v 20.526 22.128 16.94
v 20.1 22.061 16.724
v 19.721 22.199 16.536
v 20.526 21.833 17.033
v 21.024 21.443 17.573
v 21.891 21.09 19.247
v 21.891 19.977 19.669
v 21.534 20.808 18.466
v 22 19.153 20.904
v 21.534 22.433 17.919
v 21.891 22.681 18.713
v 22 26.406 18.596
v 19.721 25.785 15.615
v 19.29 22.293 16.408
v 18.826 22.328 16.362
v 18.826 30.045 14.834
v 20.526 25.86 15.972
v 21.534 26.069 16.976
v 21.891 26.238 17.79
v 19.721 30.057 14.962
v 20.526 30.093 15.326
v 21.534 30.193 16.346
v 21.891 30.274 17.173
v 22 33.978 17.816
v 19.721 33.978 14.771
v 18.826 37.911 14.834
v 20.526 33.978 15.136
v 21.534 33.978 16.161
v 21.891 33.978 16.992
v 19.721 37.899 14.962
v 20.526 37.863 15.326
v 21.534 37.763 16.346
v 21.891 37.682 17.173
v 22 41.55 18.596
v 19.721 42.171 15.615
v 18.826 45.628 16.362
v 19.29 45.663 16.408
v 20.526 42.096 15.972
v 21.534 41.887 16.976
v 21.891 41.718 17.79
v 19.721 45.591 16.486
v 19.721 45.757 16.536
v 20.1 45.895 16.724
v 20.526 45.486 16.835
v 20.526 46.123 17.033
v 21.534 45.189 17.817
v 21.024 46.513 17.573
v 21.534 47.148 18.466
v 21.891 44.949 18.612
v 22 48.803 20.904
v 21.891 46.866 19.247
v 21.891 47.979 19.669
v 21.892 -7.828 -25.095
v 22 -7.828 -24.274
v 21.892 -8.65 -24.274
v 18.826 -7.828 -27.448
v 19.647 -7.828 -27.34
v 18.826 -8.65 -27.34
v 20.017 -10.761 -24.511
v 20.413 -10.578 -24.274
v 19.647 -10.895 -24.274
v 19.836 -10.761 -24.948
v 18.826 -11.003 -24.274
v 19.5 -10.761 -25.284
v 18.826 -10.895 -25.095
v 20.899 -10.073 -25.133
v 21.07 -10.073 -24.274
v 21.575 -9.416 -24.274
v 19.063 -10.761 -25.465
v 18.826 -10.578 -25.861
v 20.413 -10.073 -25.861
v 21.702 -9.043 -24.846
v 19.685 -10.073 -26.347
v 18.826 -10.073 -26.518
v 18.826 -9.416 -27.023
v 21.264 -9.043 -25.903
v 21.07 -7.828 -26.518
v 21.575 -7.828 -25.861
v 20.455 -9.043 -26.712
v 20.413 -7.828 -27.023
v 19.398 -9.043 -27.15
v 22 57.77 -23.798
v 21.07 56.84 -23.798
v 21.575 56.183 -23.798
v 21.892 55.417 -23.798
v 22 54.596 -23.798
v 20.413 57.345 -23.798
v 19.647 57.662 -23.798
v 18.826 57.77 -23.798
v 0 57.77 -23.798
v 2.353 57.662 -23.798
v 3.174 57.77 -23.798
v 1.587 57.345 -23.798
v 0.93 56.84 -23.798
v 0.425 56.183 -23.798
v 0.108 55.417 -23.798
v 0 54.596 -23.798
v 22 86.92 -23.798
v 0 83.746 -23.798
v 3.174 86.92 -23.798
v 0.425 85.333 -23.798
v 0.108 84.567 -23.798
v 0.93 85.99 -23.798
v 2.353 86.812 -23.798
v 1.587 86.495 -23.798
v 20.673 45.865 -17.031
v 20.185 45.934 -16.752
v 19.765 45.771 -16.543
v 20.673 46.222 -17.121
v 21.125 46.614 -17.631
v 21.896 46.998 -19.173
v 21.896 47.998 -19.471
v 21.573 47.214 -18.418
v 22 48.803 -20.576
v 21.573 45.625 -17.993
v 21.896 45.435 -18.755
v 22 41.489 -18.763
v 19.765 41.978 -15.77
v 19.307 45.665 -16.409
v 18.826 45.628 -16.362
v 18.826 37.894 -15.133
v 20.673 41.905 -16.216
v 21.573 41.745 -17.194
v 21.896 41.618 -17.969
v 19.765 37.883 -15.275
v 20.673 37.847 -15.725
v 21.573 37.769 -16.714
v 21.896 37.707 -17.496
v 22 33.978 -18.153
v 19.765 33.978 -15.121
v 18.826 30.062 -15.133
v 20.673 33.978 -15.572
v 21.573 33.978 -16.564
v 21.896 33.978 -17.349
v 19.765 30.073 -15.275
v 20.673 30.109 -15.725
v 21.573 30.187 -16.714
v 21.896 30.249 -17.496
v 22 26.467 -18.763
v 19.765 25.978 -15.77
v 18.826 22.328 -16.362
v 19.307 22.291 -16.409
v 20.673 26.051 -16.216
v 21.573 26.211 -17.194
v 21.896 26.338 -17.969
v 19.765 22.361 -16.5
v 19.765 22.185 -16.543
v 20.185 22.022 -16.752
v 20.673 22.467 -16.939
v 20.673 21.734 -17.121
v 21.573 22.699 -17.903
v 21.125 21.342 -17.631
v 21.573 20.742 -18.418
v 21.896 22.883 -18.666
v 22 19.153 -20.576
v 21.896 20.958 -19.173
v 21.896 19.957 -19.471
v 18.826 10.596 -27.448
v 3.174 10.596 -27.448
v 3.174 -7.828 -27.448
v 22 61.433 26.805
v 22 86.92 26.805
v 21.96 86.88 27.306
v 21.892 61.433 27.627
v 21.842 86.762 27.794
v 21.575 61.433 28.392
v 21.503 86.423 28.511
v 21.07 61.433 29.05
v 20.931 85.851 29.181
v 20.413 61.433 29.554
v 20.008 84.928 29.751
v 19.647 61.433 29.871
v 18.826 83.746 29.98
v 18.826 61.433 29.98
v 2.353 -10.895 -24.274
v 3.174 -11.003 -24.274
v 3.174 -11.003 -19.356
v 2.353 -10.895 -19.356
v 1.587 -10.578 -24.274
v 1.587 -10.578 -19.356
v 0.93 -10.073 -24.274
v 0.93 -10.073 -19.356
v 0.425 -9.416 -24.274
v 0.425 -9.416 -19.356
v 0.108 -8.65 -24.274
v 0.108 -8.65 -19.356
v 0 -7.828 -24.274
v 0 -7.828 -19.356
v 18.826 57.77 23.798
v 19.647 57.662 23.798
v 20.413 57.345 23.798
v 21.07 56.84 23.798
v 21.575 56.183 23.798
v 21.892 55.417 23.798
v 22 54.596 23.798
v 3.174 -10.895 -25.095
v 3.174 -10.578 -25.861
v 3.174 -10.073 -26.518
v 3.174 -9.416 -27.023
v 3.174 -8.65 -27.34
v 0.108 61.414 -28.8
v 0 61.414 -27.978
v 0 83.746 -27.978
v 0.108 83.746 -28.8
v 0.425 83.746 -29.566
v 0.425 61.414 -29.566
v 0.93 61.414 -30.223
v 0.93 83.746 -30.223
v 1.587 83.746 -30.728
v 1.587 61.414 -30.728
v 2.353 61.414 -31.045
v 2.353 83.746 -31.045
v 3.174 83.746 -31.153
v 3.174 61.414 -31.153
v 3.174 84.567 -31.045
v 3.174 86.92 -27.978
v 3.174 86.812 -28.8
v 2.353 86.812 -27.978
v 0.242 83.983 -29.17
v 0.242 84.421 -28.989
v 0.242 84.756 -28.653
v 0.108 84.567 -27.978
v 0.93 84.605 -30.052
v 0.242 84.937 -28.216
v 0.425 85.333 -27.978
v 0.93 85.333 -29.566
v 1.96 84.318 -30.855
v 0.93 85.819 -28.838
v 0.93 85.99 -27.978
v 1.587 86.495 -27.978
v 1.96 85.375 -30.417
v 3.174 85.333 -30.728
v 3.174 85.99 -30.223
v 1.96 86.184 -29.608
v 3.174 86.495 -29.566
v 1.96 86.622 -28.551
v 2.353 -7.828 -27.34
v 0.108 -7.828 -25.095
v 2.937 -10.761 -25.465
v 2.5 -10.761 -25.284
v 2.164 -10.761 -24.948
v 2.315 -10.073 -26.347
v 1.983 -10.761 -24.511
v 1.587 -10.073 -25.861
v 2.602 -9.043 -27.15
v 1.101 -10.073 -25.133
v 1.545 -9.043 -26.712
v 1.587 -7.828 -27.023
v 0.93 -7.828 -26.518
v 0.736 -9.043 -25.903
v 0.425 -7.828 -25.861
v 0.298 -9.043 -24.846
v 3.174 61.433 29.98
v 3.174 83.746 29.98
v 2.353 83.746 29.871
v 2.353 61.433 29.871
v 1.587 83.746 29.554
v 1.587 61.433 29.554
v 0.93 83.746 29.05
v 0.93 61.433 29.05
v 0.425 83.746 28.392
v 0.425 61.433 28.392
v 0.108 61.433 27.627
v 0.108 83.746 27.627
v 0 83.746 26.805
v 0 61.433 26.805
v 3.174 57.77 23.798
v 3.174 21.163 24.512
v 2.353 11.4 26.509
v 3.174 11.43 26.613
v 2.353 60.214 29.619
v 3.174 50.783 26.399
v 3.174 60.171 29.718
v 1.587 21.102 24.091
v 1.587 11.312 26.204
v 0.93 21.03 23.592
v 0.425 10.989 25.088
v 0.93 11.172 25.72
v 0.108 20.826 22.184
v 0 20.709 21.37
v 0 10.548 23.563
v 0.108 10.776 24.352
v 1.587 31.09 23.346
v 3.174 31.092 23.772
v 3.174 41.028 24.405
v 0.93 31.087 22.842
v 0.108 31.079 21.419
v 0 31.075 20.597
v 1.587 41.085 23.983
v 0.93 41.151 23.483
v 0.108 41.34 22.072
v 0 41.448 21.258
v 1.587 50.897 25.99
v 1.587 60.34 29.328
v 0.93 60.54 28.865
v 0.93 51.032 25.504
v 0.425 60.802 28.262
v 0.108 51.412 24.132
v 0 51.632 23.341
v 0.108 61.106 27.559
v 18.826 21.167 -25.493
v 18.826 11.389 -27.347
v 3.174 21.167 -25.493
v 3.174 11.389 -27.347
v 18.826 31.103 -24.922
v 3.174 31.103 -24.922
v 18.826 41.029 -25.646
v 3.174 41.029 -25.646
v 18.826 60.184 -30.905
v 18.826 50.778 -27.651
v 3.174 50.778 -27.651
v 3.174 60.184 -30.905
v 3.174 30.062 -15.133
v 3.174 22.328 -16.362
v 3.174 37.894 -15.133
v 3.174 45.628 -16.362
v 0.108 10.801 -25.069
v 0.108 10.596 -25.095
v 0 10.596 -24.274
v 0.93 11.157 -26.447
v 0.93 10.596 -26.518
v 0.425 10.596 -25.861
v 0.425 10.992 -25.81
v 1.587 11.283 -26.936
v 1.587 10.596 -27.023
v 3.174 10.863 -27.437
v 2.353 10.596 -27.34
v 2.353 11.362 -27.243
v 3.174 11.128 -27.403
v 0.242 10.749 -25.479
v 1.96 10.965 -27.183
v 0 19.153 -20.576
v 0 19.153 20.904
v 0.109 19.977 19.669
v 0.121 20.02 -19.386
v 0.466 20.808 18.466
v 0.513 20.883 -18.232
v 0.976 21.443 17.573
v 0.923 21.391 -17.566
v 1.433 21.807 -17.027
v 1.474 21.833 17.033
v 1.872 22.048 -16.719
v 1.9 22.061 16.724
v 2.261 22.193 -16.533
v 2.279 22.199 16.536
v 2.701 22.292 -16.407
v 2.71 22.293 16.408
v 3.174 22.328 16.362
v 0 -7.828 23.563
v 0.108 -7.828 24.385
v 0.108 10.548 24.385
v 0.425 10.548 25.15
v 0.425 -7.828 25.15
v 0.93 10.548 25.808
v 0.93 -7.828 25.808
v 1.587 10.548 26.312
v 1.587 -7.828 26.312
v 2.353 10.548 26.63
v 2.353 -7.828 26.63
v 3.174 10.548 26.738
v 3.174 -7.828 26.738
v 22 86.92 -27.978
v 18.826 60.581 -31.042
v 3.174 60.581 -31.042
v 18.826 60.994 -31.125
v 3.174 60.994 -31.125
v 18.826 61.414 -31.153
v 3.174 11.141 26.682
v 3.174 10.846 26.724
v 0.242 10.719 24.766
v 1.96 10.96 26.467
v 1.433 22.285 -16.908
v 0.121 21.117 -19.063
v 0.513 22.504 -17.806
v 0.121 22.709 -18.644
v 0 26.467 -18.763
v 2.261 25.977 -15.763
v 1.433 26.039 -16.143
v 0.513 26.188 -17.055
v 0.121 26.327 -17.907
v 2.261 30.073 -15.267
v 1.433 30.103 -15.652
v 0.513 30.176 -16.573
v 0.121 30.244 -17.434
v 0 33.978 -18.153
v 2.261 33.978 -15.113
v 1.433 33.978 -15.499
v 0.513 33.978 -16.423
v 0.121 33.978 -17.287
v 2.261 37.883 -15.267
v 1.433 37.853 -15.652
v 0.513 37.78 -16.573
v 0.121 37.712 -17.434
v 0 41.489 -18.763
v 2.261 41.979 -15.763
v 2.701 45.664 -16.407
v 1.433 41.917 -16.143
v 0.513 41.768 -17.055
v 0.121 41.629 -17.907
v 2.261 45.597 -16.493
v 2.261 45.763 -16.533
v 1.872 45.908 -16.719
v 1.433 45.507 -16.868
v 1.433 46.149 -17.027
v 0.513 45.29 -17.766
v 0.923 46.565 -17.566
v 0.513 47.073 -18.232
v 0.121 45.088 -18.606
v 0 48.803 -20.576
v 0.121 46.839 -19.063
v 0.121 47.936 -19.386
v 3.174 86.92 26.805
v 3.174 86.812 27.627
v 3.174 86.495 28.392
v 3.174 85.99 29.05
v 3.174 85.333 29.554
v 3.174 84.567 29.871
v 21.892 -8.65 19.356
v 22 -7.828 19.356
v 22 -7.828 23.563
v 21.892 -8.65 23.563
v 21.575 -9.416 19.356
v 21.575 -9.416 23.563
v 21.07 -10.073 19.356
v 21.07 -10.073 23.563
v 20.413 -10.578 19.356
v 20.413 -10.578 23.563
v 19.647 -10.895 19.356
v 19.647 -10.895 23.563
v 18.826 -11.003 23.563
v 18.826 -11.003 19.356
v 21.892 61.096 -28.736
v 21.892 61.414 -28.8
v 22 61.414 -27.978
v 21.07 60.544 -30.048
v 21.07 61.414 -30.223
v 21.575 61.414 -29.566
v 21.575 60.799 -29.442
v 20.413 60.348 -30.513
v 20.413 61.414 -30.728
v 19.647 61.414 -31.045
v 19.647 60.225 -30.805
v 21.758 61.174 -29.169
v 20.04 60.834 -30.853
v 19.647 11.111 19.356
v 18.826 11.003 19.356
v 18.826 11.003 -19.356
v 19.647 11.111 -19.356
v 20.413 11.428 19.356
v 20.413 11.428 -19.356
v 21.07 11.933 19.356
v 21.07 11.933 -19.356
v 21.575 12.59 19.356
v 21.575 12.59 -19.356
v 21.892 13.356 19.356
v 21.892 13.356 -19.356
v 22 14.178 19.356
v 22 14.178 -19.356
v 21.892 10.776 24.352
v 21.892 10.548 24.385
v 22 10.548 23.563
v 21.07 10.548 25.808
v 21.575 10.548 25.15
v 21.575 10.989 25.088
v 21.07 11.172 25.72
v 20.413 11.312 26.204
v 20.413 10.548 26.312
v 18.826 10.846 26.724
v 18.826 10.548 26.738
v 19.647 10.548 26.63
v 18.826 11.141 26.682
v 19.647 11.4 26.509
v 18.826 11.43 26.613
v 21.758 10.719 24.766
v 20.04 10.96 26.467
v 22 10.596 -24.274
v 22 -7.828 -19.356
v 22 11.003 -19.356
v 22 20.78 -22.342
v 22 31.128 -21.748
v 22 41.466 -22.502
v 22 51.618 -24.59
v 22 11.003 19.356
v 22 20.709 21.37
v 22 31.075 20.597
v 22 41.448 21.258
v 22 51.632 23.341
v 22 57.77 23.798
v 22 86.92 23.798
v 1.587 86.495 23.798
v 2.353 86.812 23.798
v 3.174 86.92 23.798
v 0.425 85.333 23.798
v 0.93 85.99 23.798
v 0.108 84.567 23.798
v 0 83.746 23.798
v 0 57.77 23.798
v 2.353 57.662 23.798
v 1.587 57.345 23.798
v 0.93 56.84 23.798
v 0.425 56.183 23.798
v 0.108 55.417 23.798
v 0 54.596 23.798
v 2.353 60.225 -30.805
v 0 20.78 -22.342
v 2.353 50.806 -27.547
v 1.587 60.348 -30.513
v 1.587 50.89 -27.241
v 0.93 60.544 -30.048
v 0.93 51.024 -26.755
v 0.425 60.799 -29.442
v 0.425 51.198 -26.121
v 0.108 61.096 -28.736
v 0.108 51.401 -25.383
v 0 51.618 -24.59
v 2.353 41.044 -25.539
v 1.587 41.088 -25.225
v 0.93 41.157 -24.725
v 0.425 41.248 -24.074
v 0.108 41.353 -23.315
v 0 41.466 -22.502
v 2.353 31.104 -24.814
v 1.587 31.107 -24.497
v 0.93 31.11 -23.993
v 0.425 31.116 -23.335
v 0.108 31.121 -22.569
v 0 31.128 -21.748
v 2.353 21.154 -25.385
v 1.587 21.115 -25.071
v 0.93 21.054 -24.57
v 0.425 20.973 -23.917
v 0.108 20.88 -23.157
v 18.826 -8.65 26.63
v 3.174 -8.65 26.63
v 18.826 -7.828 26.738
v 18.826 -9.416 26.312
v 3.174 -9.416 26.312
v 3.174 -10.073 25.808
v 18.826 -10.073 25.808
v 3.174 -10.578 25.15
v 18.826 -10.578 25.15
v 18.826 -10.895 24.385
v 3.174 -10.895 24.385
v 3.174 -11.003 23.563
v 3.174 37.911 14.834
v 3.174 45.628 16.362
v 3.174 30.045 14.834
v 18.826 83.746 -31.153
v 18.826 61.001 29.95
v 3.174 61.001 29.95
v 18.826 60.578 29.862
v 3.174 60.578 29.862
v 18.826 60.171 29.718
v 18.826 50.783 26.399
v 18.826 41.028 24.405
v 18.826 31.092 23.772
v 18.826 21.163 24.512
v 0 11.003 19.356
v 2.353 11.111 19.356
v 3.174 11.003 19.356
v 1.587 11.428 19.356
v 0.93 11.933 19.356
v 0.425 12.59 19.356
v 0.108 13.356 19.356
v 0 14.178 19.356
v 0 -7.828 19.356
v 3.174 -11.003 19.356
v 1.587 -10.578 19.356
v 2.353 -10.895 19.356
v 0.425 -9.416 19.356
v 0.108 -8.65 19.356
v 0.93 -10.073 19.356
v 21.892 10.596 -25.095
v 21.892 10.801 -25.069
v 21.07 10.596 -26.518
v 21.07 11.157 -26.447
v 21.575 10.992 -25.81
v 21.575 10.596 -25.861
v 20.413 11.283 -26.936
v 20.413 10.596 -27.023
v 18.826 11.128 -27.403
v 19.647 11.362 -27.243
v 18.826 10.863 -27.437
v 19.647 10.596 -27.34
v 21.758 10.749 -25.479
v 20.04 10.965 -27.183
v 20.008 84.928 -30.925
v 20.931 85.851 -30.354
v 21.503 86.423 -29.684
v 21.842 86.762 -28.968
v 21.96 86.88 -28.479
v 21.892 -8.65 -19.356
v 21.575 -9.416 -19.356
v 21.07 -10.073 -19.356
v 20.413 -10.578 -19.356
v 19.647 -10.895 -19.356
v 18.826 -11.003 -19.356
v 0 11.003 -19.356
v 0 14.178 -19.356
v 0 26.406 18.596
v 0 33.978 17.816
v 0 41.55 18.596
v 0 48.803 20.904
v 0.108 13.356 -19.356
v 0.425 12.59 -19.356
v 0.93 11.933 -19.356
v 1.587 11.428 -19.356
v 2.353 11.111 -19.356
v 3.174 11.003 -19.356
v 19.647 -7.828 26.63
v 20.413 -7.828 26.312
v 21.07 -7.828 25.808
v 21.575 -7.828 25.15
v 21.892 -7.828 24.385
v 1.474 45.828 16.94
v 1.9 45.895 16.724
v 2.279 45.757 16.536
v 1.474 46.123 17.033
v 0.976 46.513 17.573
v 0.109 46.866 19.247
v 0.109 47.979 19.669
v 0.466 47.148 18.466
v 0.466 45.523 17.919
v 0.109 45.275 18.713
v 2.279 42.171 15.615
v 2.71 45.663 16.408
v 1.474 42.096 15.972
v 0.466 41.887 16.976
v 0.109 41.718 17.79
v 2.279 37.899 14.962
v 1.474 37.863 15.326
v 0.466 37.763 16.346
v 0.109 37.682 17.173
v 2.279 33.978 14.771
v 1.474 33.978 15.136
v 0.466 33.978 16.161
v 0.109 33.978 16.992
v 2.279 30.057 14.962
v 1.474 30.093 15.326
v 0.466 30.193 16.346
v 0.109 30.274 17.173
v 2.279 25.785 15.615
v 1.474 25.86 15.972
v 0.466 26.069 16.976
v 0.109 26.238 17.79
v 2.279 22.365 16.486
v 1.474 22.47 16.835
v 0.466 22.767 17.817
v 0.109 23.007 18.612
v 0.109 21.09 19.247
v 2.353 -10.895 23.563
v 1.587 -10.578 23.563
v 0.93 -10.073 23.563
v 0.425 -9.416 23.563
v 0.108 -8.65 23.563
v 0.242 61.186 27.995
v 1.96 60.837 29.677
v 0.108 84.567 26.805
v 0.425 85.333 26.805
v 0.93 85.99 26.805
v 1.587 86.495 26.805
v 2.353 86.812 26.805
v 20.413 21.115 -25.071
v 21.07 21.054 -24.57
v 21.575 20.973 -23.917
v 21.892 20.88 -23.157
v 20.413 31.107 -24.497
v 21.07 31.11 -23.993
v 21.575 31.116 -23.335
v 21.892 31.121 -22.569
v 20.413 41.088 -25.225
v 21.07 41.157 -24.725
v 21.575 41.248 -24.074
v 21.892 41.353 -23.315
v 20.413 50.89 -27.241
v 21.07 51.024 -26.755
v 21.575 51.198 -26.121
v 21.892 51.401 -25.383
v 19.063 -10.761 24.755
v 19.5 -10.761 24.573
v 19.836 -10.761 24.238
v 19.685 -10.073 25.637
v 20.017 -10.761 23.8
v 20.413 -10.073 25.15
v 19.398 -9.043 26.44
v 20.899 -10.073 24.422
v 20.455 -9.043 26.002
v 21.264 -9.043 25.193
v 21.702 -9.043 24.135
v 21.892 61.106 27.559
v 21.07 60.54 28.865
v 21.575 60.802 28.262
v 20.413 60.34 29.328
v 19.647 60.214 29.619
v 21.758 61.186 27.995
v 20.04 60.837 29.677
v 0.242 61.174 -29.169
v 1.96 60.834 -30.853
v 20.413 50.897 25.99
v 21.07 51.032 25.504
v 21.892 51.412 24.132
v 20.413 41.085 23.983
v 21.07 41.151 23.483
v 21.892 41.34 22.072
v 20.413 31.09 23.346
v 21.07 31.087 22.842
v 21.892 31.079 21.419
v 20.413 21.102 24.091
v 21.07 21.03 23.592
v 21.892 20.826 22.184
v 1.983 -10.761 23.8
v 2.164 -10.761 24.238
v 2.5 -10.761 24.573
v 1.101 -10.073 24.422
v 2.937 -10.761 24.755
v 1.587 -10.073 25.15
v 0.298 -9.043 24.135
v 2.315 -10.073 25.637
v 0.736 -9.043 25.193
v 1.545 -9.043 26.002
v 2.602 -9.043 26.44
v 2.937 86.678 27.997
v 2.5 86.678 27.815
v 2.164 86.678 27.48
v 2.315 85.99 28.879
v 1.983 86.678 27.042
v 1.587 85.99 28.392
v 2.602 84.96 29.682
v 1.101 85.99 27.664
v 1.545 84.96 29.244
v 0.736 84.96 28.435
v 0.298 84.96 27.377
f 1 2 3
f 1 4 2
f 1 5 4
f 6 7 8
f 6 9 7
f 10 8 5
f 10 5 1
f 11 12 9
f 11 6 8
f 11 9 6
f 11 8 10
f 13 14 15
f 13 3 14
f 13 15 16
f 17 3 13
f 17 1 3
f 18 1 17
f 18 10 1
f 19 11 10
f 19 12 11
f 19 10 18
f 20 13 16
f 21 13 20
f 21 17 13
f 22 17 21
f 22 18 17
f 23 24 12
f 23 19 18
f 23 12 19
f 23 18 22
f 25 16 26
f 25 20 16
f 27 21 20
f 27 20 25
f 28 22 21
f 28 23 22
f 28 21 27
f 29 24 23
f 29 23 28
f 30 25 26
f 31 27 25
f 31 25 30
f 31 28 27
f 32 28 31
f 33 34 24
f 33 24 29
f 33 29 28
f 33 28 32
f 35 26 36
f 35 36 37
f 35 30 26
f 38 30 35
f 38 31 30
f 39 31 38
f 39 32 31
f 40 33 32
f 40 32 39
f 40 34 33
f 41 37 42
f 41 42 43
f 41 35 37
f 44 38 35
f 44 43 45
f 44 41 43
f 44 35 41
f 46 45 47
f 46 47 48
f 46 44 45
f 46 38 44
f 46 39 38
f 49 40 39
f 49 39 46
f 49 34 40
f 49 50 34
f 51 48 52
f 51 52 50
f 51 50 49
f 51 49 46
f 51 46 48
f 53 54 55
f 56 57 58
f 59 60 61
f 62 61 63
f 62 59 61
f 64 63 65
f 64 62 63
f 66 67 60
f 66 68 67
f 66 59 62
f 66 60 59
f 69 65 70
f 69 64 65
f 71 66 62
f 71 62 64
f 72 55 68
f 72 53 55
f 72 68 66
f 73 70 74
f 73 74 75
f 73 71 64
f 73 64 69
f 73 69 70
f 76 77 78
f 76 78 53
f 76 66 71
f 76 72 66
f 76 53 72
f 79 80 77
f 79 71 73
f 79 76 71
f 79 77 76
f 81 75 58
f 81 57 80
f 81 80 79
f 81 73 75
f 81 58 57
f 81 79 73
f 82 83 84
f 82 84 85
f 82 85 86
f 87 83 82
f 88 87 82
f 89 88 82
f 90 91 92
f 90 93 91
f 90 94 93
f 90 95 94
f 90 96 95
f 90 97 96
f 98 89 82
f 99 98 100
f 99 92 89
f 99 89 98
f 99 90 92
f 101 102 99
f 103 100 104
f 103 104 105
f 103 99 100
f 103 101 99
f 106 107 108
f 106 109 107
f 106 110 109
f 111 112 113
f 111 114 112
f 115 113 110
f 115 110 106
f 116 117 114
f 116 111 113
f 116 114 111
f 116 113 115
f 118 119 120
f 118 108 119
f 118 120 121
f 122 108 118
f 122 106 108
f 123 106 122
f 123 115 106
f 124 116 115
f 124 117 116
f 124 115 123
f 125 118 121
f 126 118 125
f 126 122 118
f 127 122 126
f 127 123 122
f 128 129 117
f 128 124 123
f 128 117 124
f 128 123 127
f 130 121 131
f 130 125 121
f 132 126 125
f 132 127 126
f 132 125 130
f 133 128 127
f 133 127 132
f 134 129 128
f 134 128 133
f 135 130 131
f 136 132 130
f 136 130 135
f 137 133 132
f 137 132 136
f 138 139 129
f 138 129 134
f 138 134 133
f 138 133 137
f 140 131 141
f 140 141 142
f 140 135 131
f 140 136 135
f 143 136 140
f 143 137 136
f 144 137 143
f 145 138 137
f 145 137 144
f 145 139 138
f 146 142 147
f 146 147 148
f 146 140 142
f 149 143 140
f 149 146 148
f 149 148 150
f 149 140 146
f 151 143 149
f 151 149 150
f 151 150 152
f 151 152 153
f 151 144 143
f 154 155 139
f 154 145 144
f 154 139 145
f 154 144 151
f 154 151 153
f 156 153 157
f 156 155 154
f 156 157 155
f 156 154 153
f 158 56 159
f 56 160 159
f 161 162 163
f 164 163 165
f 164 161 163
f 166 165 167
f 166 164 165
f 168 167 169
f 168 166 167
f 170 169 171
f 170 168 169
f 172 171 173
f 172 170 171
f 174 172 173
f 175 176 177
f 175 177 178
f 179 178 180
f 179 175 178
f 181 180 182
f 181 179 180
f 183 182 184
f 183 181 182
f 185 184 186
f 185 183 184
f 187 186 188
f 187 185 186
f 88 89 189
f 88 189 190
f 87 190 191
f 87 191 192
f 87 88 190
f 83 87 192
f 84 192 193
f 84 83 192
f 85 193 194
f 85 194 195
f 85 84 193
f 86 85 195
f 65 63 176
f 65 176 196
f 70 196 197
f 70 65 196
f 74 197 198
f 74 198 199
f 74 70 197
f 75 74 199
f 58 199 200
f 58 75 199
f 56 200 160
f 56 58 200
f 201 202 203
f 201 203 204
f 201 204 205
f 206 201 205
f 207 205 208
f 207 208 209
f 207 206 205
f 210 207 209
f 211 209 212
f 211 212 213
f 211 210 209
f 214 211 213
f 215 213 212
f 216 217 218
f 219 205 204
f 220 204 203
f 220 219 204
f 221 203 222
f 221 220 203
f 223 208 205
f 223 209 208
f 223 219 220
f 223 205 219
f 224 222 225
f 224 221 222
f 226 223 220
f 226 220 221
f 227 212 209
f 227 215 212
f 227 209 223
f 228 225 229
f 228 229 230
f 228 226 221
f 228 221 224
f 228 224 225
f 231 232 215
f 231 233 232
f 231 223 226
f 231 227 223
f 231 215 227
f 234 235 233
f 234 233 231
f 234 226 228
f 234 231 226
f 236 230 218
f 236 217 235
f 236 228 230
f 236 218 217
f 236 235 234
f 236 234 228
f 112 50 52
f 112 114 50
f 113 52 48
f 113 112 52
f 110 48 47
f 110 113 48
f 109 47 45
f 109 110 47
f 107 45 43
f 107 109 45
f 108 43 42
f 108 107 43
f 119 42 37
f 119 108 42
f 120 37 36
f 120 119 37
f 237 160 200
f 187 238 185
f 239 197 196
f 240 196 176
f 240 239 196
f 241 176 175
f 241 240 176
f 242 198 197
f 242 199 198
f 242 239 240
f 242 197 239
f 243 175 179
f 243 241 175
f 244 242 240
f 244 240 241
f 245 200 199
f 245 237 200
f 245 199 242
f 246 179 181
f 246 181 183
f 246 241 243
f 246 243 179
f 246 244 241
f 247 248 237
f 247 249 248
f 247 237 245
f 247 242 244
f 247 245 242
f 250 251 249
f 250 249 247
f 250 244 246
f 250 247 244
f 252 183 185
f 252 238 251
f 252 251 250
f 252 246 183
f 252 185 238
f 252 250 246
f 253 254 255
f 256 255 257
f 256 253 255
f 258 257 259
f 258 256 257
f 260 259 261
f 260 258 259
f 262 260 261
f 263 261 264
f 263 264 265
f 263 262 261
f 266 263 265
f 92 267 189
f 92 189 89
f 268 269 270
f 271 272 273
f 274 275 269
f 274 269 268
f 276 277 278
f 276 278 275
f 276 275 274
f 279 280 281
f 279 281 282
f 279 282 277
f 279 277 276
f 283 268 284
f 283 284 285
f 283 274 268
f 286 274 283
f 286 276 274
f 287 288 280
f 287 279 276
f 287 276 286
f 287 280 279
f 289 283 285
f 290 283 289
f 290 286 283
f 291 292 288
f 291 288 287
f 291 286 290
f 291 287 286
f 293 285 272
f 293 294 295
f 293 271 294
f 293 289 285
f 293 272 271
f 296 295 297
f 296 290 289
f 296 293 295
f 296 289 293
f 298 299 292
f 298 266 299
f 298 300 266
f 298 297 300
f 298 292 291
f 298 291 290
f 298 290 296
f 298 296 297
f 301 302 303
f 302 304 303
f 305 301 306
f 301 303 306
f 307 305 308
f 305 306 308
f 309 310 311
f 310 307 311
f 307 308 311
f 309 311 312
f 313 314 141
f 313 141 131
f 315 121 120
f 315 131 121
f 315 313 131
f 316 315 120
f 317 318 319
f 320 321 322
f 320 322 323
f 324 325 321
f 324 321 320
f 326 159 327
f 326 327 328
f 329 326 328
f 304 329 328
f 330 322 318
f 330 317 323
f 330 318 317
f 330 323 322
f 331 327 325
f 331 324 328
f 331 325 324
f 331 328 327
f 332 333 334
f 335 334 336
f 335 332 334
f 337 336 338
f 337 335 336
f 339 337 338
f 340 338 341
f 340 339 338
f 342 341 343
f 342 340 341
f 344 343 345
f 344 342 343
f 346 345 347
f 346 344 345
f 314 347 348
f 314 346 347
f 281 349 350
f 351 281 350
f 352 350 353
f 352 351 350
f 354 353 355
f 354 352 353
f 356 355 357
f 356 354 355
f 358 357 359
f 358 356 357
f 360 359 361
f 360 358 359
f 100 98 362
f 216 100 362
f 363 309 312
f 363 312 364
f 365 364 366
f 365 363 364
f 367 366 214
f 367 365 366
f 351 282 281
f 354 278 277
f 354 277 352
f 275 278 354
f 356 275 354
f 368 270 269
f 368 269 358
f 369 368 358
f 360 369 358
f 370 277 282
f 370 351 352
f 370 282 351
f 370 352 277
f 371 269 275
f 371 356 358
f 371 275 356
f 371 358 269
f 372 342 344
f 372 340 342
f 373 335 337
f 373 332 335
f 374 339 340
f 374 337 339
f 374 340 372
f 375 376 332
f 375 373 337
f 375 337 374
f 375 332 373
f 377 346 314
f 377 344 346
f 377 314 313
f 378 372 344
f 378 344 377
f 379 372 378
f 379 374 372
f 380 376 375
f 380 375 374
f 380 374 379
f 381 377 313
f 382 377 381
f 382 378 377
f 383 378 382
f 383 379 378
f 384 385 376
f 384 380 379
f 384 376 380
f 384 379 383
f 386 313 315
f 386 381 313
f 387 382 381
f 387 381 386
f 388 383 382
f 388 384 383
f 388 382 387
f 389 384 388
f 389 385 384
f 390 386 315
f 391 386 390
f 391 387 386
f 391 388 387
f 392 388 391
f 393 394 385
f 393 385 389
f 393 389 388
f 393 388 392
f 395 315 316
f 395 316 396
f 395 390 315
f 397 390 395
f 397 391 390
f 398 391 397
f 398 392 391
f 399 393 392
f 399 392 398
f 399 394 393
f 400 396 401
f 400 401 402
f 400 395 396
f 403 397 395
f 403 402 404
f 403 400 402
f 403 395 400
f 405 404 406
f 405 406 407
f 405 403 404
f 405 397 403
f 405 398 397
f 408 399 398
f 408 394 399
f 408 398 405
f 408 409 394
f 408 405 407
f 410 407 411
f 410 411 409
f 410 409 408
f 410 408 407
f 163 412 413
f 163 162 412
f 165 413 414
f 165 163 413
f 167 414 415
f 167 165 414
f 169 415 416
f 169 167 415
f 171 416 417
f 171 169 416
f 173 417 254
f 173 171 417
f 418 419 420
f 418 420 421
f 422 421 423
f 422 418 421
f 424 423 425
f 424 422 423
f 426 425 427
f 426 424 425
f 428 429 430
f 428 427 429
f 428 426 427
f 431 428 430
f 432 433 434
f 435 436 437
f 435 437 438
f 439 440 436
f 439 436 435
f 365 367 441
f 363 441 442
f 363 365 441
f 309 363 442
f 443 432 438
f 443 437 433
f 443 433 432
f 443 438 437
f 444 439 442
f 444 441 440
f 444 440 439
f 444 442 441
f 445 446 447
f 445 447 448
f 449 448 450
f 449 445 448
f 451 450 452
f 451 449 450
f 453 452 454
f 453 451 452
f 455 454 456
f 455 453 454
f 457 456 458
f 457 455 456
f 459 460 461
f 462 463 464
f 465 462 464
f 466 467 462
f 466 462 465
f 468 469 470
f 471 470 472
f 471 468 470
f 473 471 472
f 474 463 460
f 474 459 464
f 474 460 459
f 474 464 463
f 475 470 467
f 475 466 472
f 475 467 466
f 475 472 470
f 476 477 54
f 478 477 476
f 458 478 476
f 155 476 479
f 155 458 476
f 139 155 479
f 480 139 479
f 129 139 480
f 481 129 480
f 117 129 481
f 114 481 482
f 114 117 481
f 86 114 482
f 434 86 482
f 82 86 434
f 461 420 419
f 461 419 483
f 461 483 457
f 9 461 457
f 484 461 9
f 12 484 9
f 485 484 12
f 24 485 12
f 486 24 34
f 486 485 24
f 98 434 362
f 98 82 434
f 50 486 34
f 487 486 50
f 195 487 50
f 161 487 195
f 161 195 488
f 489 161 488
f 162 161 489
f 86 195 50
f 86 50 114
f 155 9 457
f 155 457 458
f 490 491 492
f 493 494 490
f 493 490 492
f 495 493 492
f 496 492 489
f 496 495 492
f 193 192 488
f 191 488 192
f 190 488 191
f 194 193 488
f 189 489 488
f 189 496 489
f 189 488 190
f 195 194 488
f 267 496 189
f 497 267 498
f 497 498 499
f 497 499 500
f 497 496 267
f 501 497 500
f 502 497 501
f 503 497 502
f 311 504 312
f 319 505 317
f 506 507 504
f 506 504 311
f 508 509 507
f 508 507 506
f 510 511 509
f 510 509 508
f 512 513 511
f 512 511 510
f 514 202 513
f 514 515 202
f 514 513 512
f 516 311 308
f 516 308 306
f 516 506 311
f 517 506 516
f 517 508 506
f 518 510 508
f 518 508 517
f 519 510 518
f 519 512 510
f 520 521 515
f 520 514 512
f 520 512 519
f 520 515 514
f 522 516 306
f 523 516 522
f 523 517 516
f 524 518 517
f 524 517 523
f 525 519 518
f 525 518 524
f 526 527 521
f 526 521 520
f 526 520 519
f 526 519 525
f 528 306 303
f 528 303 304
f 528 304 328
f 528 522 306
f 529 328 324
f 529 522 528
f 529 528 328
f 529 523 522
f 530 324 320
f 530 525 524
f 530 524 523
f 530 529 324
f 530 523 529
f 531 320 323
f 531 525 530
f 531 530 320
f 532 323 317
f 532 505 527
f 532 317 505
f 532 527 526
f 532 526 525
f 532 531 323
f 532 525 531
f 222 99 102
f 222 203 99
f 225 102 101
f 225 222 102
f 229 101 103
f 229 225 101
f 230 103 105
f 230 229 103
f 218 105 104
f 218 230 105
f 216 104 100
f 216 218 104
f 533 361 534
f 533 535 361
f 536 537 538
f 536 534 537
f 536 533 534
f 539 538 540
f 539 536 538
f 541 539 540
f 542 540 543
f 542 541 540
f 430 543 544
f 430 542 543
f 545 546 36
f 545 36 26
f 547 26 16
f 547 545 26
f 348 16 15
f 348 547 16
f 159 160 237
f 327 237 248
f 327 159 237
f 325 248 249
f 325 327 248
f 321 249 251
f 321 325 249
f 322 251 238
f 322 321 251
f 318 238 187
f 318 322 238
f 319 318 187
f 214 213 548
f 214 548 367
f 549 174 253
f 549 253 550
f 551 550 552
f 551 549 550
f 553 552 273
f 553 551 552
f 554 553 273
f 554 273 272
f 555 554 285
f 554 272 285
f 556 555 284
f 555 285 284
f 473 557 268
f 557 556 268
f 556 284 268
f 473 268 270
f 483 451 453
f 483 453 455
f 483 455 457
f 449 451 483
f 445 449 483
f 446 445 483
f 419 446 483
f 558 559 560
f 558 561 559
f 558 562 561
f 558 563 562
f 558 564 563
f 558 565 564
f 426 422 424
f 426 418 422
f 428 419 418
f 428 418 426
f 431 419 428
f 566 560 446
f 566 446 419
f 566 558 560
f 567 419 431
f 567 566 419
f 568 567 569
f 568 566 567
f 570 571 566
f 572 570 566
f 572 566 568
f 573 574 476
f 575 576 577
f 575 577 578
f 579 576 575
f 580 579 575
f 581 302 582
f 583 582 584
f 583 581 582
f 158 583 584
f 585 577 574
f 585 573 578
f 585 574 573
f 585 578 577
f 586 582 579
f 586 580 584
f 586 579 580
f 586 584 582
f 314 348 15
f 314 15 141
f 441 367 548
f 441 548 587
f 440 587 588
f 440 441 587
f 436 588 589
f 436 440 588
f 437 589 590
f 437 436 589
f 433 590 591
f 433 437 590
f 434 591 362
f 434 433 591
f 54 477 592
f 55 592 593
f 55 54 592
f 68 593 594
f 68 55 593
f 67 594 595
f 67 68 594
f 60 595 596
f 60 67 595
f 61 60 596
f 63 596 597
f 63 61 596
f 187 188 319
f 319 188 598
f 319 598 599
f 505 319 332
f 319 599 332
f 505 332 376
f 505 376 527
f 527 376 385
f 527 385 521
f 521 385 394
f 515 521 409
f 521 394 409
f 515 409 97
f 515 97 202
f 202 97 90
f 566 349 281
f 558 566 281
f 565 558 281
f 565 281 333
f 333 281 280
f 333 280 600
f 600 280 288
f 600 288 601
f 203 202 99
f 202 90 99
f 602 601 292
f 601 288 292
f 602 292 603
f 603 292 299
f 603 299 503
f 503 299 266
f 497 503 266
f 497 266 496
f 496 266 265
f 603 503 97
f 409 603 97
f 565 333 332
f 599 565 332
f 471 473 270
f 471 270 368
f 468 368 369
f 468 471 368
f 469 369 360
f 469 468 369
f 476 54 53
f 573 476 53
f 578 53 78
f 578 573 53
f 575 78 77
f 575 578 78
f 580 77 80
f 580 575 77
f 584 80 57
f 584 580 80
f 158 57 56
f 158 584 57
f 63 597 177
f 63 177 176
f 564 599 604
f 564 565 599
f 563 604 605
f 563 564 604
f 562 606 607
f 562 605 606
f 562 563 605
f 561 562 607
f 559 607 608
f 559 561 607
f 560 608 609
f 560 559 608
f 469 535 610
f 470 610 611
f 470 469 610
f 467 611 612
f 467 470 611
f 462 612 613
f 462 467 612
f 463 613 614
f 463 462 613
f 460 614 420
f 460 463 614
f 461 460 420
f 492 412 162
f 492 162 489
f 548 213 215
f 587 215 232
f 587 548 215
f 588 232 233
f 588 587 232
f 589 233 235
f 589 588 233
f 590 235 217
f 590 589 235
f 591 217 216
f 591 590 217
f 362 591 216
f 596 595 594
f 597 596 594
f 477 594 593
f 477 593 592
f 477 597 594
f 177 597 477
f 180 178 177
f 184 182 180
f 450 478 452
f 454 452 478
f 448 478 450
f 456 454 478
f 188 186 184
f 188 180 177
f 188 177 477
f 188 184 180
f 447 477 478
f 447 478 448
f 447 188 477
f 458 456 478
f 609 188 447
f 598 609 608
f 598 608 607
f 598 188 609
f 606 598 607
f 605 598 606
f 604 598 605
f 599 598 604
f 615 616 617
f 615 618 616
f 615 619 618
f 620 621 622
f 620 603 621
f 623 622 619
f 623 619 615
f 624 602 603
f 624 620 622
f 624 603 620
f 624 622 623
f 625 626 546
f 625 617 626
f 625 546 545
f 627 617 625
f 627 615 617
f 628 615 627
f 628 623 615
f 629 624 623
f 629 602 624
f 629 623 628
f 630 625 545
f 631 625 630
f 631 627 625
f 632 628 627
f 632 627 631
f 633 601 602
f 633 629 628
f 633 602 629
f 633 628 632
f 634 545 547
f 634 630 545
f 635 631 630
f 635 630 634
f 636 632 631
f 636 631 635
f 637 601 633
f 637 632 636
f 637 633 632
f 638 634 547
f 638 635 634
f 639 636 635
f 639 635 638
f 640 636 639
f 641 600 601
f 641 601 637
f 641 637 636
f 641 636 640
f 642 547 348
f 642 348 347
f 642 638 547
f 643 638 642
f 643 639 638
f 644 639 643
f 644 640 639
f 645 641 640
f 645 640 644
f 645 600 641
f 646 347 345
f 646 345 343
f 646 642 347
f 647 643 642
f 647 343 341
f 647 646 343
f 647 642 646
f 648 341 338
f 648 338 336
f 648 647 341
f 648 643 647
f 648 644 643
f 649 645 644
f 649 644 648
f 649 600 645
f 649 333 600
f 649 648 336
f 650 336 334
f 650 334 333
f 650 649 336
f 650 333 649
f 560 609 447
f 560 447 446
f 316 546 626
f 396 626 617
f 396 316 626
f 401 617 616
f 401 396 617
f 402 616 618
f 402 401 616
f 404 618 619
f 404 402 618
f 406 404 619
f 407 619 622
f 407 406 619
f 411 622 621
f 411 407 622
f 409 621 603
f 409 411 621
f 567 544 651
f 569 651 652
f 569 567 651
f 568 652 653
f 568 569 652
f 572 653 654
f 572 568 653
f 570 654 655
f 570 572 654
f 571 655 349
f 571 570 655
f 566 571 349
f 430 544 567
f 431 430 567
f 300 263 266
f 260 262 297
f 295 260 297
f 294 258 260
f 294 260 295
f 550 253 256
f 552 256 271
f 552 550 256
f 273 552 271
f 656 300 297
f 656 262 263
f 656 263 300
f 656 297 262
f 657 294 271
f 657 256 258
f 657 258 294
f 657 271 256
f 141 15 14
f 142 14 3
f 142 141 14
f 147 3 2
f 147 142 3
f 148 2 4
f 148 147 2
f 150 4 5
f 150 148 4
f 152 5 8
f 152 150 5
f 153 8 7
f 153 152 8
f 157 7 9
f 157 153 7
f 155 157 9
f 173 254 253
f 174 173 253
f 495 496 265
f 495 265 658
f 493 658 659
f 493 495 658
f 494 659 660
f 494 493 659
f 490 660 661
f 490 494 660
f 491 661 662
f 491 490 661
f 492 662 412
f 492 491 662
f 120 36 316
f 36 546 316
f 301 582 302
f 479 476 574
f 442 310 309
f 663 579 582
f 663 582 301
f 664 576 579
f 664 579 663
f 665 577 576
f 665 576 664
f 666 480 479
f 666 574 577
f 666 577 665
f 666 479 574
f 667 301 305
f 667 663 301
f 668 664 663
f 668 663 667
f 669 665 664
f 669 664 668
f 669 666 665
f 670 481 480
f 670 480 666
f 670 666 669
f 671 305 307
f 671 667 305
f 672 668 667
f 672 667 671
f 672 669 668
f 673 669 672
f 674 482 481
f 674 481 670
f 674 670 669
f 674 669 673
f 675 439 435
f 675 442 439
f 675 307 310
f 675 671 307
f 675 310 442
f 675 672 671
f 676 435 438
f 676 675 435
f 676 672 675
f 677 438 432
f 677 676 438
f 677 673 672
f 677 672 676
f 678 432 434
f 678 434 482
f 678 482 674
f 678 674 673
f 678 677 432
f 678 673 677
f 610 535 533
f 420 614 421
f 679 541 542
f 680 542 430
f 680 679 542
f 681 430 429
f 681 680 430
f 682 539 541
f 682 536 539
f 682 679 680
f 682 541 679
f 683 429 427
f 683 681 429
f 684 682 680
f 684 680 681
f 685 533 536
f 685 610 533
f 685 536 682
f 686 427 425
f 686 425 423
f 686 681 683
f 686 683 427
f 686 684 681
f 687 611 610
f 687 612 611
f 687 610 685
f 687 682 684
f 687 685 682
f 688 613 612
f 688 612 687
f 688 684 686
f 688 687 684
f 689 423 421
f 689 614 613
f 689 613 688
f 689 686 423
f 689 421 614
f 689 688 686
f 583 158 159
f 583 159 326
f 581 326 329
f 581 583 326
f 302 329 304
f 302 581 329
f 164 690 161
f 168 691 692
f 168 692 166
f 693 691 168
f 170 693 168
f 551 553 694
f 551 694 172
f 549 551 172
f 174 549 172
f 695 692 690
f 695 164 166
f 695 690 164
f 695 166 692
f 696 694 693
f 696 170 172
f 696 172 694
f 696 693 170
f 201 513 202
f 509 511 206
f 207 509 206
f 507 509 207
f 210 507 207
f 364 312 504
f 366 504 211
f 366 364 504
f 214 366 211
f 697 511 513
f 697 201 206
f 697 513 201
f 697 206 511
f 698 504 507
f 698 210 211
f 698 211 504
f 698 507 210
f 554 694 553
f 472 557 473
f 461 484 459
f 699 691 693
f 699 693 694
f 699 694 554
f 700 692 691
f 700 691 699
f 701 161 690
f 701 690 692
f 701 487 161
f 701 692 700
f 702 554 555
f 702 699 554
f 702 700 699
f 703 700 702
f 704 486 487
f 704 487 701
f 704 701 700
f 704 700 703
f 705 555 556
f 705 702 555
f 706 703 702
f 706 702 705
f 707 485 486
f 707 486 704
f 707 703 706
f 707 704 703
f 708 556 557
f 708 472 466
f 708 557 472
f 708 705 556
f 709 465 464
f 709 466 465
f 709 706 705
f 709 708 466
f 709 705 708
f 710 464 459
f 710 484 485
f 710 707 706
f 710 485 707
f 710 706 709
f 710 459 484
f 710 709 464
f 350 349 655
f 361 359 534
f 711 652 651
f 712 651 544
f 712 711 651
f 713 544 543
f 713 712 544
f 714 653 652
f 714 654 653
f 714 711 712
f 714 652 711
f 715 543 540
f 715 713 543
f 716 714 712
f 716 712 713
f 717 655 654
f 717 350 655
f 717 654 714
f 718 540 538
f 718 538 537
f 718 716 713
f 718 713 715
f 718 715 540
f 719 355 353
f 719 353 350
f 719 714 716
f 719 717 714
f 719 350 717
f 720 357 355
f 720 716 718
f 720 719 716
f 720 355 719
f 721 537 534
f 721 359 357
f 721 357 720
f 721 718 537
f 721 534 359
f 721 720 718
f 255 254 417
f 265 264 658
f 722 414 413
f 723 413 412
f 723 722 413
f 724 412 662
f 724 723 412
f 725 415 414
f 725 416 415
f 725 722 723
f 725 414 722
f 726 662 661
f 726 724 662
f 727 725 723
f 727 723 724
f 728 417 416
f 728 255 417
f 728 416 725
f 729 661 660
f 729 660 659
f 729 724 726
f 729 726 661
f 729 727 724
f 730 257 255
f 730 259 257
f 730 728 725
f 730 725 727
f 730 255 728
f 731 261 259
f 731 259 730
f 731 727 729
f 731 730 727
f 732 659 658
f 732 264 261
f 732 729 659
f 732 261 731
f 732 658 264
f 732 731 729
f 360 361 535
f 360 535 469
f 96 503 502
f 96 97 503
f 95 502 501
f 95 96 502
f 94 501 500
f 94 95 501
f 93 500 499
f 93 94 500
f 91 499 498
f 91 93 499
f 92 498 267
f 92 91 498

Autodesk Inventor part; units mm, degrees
ref_plane "YZ Plane" through (0, 0, 0) normal (1, 0, 0) x (0, 1, 0)
ref_plane "XZ Plane" through (0, 0, 0) normal (0, 1, 0) x (-1, 0, 0)
ref_plane "XY Plane" through (0, 0, 0) normal (0, 0, 1) x (1, 0, 0)
sketch "Sketch2" plane through (0, 0, 0) normal (1, 0, 0) x (0, 1, 0)
  line L0 (-11.003, -19.3563) -> (11.003, -19.3563)
  line L1 (11.003, -19.3563) -> (11.003, 19.3563)
  line L2 (11.003, 19.3563) -> (-11.003, 19.3563)
  line L3 (57.7702, -23.7983) -> (86.9201, -23.7983)
  line L4 (86.9201, 23.7983) -> (57.7702, 23.7983)
  line L5 (57.7702, 23.7983) -> (57.7702, -23.7983)
  line L6 (57.7702, -23.7983) -> (60.4906, -19.3563) construction
  line L7 (60.4906, 19.3563) -> (57.7702, 23.7983) construction
  line L8 (86.9201, 29.9796) -> (60.767, 29.9796)
  line L9 (86.9201, -31.153) -> (60.767, -31.153)
  line L10 (-11.003, -27.448) -> (11.003, -27.448)
  line L11 (-11.003, 26.7377) -> (11.003, 26.7377)
  arc A0 (11.003, 26.7377) -> (60.767, 29.9796) centre (31.4829, 95.932) ccw
  arc A1 (60.767, -31.153) -> (11.003, -27.448) centre (30.5123, -101.4643) ccw
  line L12 (45.6284, 16.3623) -> (45.6284, -16.3623)
  line L13 (22.3276, 16.3623) -> (22.3276, -16.3623)
  arc A2 (22.3276, 16.3623) -> (45.6284, 16.3623) centre (33.978, 54.9478) ccw
  arc A3 (45.6284, -16.3623) -> (22.3276, -16.3623) centre (33.978, -64.7297) ccw
  line L14 (-11.003, 26.7377) -> (-11.003, 19.3563)
  line L15 (-11.003, -19.3563) -> (-11.003, -27.448)
  line L16 (86.9201, 29.9796) -> (86.9201, 23.7983)
  line L17 (86.9201, -23.7983) -> (86.9201, -31.153)
  point P0 (0, 0)
extrude "Extrusion2" add sketch "Sketch2" along normal blind 22
fillet "Fillet2" radius 3.175 38 edges at (22, 73.8435, 29.9796) (11, 60.767, 29.9796) (0, 73.8435, 29.9796) (0, 36.1739, 23.9231) (22, 36.1739, 23.9231) (22, 57.7702, 0) (22, 45.6284, 0) (22, 22.3276, 0) (22, 11.003, 0) (22, 33.978, -14.9789) (22, 33.978, 14.6418) (22, 36.1954, -25.1313) (22, 73.8435, -31.153) (11, 86.9201, -31.153) (11, 86.9201, 29.9796) (11, 11.003, 26.7377) (22, 0, 26.7377) (0, 0, 26.7377) (22, 0, -27.448) (0, 73.8435, -31.153) (11, 60.767, -31.153) (0, 36.1954, -25.1313) (11, 11.003, -27.448) (0, 22.3276, 0) (0, 45.6284, 0) (0, 33.978, 14.6418) (0, 33.978, -14.9789) (0, 0, -27.448) (11, -11.003, -27.448) (11, -11.003, 26.7377) (0, 11.003, 0) (0, 57.7702, 0) (0, 86.9201, -27.4756) (0, 86.9201, 26.889) (0, -11.003, -23.4021) (0, -11.003, 23.047) (22, -11.003, 23.047) (22, -11.003, -23.4021)
properties part number "arm_mid_link2"
